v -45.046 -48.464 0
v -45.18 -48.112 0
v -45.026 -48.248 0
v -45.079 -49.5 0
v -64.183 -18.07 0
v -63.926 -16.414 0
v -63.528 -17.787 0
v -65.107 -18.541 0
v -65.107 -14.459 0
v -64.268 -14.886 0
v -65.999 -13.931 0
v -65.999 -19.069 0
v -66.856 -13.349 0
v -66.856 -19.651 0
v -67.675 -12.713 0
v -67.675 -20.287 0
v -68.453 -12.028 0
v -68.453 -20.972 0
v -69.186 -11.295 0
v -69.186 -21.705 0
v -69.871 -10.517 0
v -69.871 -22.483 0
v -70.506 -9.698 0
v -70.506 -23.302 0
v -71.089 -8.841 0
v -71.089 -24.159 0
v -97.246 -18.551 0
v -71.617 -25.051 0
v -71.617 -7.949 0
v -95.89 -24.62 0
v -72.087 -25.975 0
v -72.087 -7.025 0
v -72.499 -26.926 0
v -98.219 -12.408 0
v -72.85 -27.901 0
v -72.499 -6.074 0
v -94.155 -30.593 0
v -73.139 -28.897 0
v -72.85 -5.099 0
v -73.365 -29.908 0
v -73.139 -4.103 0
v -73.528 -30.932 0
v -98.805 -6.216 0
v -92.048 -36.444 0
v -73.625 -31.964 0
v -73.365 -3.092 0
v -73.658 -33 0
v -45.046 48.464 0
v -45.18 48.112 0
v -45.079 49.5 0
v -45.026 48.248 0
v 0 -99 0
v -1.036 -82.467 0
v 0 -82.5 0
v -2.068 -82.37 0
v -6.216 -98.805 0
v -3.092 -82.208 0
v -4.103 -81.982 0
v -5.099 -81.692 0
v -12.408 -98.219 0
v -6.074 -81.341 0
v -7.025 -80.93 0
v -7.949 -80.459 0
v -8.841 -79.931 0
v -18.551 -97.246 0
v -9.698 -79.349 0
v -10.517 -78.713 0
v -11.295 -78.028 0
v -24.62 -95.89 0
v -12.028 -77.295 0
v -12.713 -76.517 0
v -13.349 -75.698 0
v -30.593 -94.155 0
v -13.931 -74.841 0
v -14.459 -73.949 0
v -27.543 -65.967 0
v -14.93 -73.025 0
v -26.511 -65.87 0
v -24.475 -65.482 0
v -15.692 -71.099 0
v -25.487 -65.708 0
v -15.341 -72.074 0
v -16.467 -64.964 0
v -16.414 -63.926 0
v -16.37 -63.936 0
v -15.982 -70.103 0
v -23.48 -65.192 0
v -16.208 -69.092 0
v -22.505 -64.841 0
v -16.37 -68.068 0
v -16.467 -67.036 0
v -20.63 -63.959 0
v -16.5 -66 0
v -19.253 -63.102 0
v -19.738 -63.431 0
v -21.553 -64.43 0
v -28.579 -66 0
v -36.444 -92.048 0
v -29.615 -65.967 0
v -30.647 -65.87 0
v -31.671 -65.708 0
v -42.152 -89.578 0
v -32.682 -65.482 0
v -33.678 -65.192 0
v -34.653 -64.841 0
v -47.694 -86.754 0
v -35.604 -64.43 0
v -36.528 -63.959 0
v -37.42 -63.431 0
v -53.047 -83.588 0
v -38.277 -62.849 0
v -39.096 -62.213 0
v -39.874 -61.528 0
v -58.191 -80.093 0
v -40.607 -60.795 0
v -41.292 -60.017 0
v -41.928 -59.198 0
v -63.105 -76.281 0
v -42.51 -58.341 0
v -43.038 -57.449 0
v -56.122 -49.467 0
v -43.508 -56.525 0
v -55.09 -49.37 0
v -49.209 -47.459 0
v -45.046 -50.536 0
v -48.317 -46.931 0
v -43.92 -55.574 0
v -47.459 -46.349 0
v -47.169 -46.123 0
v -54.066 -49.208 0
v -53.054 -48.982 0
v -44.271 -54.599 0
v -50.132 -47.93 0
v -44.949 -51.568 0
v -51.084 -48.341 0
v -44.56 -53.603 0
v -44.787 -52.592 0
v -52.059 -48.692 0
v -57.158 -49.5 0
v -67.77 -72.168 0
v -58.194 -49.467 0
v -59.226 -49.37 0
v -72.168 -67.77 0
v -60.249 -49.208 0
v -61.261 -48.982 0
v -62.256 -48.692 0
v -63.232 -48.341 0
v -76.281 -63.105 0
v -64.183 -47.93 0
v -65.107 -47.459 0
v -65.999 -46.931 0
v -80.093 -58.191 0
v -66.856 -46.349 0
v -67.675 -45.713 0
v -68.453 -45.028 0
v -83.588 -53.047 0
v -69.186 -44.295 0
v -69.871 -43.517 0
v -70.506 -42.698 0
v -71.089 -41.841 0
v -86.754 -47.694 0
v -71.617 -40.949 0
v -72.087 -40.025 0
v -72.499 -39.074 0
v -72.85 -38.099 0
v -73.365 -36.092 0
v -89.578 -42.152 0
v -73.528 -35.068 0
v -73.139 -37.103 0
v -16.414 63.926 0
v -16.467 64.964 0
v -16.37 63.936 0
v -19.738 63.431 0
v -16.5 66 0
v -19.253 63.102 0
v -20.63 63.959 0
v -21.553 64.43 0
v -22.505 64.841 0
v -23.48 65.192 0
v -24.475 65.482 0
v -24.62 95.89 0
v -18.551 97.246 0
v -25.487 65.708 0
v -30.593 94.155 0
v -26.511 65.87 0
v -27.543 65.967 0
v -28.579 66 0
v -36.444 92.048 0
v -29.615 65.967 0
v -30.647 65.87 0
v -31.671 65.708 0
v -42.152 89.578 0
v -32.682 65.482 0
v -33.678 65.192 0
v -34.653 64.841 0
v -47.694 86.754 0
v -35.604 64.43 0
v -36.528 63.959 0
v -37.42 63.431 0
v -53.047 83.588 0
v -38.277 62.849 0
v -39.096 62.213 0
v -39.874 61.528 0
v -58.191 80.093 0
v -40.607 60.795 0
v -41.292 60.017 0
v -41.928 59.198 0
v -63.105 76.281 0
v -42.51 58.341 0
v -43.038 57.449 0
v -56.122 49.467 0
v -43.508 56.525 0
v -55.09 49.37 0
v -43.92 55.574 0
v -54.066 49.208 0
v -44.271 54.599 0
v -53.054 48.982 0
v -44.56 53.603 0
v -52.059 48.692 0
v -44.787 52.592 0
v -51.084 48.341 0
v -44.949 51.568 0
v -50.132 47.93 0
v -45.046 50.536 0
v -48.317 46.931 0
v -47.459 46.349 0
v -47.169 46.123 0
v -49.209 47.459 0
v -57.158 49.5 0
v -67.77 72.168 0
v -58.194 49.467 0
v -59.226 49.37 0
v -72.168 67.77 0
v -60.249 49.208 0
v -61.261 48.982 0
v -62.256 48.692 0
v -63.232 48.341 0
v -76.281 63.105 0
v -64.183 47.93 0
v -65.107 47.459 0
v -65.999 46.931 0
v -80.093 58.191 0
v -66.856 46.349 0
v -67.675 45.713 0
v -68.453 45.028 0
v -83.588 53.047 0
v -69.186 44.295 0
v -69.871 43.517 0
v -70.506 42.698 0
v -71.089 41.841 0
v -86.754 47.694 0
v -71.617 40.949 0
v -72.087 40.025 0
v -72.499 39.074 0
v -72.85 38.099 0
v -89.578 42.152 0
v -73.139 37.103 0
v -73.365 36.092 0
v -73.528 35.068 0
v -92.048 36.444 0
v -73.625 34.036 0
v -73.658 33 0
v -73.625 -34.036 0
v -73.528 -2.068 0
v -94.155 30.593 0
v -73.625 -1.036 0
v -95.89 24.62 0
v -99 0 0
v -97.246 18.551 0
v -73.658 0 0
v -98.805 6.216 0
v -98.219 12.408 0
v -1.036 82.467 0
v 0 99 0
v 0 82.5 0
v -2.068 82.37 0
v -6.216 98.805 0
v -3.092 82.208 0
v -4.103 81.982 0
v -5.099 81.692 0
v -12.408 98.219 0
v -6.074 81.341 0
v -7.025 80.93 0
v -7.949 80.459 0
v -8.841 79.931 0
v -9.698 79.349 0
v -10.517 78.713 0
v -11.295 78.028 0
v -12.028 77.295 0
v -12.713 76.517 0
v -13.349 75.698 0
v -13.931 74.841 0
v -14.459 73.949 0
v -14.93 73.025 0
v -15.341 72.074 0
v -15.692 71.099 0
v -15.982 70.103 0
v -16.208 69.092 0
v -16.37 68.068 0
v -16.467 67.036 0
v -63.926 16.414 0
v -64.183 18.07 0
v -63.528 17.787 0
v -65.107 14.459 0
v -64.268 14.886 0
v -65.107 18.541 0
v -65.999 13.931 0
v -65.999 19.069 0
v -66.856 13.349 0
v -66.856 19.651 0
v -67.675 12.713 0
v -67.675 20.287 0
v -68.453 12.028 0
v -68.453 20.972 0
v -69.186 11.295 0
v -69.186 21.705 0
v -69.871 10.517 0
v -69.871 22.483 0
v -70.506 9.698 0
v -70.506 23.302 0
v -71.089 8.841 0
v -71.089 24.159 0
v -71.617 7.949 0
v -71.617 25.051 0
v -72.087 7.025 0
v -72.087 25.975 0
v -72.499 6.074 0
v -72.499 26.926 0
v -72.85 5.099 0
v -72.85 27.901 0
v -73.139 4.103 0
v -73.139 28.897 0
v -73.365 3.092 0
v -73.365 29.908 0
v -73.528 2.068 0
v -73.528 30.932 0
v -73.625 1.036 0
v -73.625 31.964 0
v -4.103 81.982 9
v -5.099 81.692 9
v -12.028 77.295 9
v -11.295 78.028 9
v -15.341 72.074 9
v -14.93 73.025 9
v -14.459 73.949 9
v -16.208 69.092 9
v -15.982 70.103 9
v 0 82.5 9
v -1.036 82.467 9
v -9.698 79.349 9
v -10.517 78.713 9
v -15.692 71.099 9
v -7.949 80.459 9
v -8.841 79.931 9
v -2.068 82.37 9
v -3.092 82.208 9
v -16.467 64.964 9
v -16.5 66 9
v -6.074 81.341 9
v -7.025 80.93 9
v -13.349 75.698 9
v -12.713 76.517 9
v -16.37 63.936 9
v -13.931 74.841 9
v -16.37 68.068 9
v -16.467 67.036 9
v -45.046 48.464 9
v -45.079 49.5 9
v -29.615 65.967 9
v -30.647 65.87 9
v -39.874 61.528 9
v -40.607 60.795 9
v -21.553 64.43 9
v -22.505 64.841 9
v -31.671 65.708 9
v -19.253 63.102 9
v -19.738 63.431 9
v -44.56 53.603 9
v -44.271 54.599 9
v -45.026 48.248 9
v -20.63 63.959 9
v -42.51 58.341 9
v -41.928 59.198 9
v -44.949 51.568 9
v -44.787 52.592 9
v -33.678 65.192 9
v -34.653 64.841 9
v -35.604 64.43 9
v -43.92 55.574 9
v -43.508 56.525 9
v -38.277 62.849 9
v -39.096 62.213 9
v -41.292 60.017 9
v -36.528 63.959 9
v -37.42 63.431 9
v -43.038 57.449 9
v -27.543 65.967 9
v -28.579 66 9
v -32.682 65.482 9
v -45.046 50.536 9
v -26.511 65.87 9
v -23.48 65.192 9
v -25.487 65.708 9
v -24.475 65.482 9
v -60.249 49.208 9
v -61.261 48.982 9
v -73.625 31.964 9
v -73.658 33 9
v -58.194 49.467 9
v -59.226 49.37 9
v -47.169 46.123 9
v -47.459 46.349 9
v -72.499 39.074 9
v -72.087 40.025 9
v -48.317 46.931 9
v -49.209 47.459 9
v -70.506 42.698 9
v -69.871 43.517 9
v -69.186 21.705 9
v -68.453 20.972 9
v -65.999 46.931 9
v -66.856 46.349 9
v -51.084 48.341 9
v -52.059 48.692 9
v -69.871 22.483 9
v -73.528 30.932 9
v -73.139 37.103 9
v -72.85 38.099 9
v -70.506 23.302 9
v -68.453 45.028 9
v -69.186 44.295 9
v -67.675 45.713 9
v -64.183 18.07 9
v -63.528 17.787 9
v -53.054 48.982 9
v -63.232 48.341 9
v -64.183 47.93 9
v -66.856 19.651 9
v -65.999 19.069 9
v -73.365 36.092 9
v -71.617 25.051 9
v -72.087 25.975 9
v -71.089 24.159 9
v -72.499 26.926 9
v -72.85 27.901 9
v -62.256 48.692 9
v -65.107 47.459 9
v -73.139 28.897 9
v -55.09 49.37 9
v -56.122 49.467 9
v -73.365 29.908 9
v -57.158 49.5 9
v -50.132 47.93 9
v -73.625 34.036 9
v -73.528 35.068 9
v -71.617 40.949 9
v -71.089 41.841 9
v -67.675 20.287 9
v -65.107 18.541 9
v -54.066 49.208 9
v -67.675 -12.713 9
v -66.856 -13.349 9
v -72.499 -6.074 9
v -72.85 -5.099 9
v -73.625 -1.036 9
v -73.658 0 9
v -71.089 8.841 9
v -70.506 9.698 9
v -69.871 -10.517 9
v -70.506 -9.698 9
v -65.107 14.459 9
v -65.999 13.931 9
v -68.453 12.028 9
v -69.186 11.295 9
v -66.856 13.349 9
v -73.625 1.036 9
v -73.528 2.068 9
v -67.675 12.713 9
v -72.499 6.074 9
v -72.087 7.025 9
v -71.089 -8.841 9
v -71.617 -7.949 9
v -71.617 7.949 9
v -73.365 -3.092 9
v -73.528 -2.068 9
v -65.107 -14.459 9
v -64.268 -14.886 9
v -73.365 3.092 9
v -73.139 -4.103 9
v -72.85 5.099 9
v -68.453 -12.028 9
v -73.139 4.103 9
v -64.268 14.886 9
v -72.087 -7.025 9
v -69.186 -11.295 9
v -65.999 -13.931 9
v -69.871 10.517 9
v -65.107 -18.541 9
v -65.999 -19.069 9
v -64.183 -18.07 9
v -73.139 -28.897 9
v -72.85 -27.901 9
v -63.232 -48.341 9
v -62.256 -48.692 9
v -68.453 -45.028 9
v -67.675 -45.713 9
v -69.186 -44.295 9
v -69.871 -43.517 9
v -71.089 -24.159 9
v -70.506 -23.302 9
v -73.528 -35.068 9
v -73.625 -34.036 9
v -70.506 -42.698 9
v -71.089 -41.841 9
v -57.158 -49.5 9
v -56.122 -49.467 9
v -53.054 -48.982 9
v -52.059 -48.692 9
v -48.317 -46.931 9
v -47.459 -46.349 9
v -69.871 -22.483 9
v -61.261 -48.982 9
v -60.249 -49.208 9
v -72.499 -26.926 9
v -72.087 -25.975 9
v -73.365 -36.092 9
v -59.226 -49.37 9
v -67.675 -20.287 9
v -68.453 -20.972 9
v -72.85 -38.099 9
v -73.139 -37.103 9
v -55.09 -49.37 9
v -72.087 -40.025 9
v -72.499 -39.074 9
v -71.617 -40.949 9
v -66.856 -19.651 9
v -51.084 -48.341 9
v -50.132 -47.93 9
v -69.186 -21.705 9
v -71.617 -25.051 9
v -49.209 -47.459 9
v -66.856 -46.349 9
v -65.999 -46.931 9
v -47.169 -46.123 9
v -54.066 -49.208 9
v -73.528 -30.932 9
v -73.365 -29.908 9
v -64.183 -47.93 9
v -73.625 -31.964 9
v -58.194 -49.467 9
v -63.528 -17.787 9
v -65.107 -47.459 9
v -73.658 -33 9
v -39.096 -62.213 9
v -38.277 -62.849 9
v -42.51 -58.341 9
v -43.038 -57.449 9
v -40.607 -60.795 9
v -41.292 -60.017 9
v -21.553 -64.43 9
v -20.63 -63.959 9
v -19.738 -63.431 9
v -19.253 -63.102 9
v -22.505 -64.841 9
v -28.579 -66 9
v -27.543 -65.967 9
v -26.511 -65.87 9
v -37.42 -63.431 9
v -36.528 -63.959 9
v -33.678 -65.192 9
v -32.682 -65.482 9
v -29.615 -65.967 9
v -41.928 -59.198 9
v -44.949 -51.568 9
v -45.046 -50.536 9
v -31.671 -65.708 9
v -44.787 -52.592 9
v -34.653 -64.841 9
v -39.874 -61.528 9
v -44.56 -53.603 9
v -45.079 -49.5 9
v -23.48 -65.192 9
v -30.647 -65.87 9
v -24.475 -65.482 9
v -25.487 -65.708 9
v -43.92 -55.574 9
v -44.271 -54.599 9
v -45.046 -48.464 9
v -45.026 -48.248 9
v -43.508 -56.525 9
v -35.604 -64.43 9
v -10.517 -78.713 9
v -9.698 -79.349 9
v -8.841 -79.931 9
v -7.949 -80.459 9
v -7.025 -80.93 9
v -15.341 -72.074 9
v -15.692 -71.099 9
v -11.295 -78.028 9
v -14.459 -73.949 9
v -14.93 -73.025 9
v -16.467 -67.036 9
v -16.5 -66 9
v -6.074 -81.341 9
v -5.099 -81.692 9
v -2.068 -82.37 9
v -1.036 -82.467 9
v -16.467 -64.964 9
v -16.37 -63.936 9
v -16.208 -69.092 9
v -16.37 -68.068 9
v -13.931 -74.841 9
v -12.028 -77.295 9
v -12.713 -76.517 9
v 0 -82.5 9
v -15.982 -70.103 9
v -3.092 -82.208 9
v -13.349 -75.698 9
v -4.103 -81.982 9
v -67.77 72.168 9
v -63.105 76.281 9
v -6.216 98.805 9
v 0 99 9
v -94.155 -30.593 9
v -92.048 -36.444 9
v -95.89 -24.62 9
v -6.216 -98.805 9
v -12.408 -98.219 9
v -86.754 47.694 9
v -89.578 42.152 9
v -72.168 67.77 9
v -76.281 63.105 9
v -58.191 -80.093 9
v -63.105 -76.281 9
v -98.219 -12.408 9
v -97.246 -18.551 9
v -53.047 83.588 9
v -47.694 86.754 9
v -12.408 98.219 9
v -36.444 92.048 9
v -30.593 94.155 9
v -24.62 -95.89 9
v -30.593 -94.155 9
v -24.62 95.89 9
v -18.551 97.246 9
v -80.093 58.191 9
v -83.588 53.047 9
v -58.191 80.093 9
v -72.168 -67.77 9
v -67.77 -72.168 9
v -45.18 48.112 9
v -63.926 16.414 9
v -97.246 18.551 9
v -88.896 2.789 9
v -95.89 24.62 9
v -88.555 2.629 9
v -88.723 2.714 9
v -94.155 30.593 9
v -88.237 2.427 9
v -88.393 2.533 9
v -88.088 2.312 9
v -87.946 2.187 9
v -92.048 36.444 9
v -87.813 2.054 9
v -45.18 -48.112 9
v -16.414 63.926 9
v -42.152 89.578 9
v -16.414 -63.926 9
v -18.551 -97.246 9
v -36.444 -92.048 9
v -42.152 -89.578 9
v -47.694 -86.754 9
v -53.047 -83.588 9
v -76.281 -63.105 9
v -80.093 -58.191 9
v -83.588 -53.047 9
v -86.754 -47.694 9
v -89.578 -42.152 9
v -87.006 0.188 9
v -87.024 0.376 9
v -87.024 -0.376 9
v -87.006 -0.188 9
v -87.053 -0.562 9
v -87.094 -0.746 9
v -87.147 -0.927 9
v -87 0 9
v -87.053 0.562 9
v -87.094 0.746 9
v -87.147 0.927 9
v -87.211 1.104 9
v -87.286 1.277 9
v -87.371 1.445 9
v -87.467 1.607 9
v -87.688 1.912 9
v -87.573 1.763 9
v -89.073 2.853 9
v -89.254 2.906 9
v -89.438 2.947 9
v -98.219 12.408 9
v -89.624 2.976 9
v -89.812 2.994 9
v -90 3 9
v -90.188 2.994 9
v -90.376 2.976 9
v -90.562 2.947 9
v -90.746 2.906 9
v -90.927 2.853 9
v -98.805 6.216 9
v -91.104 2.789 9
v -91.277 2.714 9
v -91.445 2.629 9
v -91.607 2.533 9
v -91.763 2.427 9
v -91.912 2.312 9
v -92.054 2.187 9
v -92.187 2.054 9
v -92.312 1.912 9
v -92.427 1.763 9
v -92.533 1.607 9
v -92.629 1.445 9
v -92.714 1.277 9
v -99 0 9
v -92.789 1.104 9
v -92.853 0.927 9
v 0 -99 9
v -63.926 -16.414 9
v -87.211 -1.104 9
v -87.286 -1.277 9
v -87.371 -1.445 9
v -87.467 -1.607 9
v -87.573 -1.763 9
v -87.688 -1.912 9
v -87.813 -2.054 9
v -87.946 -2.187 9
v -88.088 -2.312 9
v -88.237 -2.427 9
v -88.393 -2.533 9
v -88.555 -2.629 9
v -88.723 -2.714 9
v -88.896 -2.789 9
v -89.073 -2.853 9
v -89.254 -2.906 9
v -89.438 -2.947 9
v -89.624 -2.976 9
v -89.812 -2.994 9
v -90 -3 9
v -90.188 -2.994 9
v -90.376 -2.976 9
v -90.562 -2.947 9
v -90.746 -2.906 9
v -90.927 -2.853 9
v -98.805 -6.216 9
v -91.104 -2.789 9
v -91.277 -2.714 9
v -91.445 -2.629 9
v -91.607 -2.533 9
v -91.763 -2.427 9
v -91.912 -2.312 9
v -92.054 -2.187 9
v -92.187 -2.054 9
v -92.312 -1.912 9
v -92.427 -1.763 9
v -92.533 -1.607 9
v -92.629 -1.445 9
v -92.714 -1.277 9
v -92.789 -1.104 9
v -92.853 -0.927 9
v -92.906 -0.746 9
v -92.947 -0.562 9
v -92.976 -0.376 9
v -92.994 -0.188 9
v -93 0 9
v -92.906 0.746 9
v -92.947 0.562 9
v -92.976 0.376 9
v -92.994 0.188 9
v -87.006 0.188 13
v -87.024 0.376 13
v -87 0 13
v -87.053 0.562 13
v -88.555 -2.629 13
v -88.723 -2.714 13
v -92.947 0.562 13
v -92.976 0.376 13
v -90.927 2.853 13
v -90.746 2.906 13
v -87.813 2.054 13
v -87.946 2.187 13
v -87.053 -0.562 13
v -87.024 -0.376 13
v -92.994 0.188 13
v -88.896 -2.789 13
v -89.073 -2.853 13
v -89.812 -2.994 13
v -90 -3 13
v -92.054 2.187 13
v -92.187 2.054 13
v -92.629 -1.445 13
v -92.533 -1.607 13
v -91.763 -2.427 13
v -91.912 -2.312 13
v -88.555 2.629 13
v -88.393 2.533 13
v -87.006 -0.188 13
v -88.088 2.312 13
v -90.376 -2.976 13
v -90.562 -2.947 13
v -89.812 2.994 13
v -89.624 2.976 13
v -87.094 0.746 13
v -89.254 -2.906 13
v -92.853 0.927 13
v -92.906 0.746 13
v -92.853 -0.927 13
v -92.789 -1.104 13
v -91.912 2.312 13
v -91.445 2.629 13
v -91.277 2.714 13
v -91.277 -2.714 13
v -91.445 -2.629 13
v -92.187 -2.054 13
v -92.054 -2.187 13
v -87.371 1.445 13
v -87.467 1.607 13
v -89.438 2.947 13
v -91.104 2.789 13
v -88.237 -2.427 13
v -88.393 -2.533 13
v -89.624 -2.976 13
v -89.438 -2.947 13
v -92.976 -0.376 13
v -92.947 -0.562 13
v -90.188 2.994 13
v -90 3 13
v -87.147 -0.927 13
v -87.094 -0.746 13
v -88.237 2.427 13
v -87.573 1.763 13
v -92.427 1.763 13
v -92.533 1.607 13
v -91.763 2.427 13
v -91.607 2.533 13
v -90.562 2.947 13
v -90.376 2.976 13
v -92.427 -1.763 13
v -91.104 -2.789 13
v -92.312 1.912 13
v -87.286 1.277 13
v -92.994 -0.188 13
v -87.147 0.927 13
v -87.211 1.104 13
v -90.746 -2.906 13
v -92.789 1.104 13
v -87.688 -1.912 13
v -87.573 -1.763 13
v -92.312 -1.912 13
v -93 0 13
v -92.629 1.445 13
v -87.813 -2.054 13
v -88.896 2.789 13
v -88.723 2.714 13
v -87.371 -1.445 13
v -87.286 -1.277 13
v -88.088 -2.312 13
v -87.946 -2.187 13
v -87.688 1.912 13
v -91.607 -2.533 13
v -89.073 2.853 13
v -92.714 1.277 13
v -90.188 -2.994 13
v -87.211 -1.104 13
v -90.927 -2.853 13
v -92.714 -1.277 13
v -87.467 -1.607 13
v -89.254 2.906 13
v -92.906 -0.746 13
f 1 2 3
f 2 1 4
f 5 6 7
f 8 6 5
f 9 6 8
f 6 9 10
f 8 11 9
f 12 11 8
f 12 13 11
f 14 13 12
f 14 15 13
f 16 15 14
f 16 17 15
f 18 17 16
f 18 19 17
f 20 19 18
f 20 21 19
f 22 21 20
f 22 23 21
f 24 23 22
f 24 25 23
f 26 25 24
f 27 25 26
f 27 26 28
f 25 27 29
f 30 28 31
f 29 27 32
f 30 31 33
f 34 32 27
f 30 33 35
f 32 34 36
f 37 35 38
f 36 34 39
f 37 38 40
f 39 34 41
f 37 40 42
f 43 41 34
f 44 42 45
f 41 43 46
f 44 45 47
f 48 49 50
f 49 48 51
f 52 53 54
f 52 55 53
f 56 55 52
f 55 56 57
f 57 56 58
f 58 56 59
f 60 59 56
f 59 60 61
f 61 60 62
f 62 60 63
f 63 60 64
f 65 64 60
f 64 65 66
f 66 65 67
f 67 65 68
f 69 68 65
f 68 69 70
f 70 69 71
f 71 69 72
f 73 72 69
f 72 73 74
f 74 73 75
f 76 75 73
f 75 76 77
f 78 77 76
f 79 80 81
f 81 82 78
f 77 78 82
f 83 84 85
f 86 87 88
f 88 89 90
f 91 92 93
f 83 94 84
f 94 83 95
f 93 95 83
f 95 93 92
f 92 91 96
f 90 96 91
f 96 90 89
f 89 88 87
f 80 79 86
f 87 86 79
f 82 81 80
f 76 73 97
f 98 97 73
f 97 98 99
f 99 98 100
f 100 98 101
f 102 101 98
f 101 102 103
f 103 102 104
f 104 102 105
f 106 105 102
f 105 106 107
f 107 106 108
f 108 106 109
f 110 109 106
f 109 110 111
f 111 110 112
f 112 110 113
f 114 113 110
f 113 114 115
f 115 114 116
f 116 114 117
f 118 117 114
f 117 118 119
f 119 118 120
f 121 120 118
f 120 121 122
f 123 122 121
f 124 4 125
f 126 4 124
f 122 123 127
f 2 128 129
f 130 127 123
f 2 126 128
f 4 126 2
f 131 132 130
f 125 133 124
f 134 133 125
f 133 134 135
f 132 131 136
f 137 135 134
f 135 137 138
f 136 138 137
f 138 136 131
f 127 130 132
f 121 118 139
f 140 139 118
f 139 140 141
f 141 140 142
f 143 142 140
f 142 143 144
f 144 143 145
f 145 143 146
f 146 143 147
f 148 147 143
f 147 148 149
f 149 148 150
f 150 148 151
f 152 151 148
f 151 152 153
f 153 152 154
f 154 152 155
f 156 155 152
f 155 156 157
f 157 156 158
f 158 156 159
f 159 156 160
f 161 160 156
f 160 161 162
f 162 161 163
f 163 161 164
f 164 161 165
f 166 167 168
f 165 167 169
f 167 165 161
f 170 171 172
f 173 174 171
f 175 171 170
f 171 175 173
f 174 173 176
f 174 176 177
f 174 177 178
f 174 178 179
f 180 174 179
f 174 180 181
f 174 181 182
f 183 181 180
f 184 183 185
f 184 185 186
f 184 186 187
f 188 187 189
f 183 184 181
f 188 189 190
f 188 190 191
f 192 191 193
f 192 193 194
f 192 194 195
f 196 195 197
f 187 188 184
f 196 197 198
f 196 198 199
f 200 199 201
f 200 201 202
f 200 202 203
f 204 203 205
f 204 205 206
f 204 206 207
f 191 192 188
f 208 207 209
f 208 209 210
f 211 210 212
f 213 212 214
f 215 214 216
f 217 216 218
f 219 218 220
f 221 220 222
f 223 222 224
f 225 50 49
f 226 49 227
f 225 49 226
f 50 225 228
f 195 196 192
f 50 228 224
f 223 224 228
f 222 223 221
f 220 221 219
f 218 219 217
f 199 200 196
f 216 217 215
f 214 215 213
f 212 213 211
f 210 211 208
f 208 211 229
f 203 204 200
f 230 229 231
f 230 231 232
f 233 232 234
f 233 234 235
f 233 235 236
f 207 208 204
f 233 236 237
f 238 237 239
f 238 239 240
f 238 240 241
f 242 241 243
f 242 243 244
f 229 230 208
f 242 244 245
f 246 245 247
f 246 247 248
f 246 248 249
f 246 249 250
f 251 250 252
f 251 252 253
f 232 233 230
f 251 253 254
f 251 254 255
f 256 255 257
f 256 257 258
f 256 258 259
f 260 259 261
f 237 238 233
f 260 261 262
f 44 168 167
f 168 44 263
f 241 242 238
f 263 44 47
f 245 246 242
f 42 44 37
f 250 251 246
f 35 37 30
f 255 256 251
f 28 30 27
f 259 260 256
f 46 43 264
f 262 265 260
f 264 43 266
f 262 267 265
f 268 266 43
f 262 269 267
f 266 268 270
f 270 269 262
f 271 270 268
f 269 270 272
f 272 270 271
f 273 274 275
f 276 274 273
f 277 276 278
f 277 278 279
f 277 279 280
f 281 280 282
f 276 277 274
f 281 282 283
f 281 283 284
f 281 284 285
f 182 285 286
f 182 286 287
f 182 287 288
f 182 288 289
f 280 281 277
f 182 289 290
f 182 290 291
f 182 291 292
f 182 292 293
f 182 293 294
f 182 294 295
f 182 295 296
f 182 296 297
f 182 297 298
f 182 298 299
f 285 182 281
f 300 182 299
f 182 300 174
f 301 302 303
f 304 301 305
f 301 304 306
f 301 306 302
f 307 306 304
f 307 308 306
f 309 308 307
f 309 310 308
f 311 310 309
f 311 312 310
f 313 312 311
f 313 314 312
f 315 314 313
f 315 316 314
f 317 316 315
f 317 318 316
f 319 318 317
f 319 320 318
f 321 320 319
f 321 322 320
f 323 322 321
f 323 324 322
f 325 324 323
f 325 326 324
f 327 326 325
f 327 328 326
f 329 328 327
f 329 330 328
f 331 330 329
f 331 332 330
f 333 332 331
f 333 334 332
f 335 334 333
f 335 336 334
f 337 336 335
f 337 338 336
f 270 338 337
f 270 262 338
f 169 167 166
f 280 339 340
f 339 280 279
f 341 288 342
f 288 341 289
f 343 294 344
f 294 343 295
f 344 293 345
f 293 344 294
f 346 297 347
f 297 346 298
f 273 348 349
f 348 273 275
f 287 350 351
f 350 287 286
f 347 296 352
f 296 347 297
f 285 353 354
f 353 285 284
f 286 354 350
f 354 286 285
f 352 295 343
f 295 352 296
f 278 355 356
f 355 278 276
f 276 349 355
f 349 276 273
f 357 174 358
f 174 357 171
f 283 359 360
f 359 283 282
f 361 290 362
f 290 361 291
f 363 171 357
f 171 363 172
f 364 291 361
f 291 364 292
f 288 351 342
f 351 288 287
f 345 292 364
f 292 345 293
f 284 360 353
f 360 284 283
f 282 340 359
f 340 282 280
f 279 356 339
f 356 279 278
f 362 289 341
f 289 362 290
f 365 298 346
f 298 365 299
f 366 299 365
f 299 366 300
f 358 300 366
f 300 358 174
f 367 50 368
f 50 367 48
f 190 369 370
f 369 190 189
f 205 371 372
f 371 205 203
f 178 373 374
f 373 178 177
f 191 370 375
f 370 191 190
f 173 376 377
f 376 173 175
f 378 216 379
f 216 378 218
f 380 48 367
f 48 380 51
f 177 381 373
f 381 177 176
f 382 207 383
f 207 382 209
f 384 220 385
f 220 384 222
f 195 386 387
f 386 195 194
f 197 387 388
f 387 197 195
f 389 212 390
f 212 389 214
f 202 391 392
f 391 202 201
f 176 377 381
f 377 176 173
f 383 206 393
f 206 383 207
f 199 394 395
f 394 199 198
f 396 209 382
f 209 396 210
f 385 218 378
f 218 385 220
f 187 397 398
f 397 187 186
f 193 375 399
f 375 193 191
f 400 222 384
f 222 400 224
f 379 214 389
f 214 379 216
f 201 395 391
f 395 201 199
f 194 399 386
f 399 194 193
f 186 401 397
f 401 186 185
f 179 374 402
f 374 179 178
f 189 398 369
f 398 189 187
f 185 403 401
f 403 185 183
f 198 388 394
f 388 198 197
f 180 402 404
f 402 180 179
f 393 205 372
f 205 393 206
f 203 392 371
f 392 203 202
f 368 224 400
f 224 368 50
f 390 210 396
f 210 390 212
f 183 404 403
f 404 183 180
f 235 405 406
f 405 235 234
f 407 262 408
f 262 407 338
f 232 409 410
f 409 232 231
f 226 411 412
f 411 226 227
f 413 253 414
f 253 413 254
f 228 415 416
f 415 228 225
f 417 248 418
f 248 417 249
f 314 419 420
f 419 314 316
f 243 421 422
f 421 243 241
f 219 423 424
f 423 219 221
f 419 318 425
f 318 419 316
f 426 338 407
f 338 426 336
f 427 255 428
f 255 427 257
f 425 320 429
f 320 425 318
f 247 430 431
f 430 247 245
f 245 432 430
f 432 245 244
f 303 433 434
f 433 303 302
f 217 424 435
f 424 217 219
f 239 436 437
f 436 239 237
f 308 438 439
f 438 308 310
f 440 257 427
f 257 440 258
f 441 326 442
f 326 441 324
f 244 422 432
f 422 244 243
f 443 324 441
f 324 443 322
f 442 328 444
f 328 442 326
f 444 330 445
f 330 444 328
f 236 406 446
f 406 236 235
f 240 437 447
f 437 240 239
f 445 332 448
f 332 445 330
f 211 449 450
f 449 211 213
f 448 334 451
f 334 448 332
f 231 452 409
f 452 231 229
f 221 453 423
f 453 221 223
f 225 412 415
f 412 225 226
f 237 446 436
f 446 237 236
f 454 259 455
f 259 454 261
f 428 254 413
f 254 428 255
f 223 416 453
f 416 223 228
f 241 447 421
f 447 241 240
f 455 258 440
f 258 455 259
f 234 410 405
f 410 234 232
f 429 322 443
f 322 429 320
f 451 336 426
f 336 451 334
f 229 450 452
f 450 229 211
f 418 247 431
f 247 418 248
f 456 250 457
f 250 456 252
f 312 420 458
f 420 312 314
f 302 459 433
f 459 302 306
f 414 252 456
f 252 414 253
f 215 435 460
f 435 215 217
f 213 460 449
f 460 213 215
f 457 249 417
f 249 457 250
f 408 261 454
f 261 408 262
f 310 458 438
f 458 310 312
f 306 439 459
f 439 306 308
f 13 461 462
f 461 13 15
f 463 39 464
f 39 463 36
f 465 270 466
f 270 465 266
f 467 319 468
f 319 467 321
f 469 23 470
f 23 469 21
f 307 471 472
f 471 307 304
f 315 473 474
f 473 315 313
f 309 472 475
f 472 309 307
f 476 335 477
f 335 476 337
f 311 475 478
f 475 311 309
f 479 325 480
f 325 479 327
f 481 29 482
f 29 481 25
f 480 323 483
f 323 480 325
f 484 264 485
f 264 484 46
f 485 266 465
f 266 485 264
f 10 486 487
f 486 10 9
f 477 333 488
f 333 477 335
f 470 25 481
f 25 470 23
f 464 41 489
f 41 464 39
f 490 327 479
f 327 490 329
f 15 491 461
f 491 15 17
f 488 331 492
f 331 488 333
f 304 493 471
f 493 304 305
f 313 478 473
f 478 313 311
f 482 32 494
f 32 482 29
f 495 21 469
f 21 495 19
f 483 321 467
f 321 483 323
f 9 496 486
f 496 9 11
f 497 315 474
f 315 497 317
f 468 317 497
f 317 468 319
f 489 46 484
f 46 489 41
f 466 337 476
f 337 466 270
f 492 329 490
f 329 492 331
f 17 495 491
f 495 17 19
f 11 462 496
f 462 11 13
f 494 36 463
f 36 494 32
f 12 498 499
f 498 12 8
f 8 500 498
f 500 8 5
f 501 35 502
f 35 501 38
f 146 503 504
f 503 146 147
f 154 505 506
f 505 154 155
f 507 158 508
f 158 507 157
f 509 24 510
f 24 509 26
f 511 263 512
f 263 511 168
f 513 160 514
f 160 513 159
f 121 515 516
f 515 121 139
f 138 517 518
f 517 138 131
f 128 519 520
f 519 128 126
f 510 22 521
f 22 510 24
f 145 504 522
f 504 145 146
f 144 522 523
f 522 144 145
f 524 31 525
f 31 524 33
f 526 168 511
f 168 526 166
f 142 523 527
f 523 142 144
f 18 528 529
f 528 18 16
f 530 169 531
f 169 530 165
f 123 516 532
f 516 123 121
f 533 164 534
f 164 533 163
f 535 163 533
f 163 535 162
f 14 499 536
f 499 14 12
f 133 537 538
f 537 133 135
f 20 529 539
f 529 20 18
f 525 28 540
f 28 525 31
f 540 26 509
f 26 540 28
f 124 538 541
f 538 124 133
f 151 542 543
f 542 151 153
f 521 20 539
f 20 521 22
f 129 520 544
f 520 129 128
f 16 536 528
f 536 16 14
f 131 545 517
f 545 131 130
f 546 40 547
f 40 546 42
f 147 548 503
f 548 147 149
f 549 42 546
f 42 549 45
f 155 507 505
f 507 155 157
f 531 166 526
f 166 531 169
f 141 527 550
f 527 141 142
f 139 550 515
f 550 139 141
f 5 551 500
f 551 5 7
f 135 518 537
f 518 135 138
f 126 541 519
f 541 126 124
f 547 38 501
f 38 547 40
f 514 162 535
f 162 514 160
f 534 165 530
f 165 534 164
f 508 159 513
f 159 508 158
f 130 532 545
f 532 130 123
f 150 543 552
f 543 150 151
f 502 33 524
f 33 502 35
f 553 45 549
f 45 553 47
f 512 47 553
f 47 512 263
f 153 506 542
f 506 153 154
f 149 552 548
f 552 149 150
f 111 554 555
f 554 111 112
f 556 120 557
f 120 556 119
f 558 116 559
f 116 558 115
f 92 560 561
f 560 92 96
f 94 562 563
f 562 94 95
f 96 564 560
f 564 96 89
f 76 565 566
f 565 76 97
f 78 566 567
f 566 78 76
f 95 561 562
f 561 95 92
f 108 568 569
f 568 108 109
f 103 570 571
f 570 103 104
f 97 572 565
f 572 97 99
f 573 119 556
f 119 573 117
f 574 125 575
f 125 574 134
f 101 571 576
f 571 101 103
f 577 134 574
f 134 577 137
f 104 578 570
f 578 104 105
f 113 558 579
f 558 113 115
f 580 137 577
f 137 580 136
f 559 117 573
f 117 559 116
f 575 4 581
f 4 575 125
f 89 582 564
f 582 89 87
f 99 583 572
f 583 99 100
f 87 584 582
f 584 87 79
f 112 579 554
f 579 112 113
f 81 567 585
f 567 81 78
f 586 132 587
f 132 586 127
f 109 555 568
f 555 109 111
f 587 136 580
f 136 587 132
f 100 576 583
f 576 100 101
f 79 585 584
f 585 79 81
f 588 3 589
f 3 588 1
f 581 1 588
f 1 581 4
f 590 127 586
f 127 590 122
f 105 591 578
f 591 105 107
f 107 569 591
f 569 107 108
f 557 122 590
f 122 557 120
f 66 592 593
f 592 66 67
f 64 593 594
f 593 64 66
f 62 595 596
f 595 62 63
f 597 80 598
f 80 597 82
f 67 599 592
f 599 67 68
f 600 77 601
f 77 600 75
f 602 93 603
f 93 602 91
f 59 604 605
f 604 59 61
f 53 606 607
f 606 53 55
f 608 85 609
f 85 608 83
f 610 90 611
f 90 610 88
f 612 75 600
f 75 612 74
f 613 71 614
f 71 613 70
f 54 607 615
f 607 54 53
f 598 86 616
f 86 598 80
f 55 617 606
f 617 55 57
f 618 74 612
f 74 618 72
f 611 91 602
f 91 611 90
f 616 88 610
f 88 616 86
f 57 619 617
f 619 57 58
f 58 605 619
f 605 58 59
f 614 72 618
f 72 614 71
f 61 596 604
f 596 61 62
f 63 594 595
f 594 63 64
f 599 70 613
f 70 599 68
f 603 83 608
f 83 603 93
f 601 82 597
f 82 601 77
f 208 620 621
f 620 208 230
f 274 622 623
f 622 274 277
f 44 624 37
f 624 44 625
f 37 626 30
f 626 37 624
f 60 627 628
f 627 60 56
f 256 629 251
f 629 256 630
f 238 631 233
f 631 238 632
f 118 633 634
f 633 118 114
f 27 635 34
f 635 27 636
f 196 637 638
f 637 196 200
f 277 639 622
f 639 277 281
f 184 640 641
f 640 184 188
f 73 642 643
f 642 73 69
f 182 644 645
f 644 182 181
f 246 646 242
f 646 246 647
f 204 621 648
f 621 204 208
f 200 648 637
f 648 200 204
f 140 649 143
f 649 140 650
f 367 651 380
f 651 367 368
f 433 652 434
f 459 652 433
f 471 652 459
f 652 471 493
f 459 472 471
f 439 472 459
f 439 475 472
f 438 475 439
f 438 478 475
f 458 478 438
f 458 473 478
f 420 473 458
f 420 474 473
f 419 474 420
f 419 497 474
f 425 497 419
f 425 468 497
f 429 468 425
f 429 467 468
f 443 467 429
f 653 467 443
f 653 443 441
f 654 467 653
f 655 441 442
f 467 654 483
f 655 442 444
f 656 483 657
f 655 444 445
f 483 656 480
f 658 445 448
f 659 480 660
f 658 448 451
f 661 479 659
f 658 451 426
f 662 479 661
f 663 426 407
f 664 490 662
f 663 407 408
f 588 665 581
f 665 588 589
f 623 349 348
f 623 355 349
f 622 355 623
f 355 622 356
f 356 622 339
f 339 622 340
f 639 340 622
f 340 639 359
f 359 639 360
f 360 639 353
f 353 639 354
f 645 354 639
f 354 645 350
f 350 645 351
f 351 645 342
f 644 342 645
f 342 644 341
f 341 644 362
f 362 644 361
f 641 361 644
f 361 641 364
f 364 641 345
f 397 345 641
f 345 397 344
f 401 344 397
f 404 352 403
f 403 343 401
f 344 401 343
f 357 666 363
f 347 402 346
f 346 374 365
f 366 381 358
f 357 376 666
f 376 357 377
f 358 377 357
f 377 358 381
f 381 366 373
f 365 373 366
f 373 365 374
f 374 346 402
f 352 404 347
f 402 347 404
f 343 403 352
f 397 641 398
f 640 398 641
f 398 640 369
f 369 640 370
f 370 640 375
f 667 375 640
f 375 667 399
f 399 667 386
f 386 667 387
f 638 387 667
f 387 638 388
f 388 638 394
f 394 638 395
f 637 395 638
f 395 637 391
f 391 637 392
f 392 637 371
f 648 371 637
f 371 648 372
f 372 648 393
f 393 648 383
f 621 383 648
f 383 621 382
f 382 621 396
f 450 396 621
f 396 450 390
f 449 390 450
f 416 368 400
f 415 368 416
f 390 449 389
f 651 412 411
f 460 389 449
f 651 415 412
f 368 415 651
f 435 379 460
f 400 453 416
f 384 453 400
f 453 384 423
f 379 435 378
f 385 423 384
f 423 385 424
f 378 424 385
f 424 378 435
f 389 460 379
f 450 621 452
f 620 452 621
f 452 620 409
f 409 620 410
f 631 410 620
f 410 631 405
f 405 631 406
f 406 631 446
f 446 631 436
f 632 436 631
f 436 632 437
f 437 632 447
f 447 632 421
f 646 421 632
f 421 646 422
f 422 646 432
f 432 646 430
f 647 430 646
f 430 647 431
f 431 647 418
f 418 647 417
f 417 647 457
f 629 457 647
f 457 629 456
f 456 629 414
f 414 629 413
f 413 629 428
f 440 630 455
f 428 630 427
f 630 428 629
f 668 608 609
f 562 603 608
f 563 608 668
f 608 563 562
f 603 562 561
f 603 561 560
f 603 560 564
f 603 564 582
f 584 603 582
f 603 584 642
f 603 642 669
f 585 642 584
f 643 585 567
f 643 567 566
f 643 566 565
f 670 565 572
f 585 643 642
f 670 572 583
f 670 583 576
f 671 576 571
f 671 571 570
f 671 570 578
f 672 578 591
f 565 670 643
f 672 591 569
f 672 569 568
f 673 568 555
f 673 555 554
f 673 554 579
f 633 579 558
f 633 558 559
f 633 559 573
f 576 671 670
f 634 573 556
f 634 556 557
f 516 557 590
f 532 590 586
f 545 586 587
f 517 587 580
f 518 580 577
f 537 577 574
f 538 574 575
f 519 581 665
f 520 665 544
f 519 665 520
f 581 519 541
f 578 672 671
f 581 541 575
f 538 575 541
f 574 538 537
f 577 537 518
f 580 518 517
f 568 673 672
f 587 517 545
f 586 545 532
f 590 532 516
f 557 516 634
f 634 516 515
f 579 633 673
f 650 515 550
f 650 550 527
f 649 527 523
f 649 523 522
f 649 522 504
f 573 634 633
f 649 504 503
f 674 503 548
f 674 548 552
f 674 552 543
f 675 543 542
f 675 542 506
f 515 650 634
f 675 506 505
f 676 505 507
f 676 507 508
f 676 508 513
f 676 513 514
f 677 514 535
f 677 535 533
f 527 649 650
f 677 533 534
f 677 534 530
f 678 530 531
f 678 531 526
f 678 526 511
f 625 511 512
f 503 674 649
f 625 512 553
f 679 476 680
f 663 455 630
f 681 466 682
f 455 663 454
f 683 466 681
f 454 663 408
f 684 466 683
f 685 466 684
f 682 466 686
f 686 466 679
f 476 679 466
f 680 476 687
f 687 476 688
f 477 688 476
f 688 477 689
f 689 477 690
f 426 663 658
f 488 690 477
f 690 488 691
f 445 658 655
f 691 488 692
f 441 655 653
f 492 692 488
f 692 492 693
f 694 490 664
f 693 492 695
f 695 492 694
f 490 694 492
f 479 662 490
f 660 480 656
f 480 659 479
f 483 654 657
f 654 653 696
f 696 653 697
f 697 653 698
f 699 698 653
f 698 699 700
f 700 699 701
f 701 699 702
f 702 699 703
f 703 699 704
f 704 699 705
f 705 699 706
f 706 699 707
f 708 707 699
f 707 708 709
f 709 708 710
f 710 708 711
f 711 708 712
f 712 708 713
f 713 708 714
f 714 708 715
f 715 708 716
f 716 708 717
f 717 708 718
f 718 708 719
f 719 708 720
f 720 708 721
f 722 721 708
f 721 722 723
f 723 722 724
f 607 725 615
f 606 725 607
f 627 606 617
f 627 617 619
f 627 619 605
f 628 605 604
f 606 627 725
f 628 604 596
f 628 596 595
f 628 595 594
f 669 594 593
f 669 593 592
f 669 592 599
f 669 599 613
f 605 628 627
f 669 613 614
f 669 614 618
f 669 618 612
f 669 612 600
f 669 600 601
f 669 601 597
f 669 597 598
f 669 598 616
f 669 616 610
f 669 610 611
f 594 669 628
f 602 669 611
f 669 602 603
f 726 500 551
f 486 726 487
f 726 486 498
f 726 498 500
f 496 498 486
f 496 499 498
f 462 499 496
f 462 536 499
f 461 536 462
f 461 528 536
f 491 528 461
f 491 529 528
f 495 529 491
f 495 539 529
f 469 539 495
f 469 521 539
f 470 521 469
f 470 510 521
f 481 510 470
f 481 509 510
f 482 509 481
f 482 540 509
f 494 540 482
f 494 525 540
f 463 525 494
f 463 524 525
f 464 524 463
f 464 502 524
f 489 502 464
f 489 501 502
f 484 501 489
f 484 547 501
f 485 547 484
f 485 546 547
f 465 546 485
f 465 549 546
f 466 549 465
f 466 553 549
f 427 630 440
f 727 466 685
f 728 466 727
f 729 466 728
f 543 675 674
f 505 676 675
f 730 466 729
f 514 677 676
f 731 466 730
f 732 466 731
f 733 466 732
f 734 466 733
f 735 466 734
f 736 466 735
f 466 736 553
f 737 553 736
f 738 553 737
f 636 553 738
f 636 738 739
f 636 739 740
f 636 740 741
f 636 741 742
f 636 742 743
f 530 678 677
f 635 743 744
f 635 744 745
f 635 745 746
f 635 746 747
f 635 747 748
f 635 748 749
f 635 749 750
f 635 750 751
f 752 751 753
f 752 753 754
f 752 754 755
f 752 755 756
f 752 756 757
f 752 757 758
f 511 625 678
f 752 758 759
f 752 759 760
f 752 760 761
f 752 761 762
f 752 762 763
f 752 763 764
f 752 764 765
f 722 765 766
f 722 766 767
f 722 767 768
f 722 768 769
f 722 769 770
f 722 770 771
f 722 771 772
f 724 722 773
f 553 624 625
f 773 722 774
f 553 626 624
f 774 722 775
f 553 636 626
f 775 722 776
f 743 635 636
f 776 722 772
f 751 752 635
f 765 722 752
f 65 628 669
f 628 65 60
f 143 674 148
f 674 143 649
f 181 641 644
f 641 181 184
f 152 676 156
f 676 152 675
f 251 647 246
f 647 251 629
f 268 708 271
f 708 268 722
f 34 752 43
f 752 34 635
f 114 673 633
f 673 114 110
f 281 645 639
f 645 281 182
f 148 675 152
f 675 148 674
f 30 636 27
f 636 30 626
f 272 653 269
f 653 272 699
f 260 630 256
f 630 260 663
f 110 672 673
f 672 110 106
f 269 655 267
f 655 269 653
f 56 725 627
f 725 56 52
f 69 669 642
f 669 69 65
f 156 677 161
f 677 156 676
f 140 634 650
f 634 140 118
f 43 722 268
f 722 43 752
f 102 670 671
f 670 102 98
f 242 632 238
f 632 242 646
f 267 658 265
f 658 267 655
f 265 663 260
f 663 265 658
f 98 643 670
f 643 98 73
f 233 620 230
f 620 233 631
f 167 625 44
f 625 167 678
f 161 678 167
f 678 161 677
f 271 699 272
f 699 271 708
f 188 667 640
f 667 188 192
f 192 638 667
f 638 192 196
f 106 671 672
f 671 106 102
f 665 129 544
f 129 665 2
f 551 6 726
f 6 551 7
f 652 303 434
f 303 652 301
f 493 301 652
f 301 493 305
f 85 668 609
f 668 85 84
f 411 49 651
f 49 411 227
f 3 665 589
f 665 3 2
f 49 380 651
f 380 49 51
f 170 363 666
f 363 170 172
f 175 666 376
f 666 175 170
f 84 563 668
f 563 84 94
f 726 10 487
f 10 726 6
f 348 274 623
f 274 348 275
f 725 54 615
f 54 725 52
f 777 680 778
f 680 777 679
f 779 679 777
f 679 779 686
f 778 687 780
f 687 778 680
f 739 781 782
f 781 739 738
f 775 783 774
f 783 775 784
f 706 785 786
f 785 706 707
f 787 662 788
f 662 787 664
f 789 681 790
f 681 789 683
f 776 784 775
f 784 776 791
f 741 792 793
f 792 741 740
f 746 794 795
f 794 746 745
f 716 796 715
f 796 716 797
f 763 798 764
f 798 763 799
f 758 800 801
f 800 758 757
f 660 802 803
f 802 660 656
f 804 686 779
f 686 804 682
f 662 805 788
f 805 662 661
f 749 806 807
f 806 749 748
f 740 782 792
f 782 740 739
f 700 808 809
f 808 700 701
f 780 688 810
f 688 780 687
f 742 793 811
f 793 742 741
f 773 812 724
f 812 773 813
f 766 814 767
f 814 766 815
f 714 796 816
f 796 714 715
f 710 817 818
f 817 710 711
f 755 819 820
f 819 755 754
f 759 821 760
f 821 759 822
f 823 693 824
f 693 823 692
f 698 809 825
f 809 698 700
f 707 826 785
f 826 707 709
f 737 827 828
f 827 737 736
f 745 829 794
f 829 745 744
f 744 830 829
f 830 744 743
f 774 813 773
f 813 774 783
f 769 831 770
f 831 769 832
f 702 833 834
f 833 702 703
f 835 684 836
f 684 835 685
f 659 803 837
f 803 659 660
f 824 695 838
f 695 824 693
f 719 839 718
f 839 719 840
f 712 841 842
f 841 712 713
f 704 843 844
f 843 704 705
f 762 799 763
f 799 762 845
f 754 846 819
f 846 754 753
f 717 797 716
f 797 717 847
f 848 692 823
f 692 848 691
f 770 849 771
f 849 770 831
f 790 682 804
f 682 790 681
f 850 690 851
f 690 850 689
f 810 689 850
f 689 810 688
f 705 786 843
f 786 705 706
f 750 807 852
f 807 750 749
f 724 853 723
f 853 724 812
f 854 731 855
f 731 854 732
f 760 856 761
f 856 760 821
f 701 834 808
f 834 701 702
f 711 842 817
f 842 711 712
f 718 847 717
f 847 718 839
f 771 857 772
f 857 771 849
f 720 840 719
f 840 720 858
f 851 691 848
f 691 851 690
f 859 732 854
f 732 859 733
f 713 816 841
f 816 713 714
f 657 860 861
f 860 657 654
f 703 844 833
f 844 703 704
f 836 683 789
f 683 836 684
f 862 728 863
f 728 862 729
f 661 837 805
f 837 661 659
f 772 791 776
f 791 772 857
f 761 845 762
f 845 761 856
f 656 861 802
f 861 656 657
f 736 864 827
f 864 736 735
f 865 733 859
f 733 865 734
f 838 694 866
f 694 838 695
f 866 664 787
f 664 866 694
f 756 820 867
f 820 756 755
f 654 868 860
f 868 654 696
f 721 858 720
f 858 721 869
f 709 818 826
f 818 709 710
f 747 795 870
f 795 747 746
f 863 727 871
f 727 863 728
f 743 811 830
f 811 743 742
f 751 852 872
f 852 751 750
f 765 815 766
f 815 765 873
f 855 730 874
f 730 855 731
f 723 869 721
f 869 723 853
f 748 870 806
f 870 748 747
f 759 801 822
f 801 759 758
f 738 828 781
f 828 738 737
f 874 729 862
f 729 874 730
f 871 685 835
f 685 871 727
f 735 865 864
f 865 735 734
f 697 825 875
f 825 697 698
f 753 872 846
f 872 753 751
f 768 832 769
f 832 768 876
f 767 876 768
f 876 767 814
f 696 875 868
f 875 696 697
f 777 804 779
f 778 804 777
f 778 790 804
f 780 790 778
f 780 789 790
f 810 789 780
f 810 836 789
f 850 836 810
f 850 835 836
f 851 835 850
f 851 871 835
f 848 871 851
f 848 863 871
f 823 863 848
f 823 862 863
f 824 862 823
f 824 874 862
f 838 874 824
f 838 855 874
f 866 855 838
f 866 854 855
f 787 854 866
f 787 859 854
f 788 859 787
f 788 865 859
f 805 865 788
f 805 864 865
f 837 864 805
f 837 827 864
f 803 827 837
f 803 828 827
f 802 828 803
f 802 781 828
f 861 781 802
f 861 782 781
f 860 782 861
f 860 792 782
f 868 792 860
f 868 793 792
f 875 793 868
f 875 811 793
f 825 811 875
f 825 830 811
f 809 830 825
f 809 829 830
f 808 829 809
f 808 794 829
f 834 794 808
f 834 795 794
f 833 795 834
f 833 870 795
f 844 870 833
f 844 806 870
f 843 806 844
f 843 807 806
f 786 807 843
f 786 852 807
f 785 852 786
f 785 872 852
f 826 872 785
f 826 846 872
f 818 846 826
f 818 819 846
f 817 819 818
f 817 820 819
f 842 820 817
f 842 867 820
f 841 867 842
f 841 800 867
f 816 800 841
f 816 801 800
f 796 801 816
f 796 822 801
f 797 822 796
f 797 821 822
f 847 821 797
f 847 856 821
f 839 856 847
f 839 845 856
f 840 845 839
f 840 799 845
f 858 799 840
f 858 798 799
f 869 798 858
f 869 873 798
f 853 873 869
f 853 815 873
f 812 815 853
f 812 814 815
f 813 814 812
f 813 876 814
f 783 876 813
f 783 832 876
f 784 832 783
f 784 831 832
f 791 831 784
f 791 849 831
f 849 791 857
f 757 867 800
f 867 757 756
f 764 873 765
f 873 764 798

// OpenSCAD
$fn=100;
difference()
{
    // Major portion of the solid
    cylinder(r=16.5*6,h=9);

    r=16.5;
    h=10;
    for (a = [0:6])
    {
        ang=a*60;
        l=3.4641*r;
        // Pcoords: (2*sart(3)*r, 30)
        translate([l*cos(ang),l*sin(ang),0]) cylinder(r=r, h=h);
        nang=ang+30;
        nl=4*r;
        // Pcoords: (4*r, 60)
        translate([nl*cos(nang),nl*sin(nang),0]) cylinder(r=r, h=h);
    }
    // Get rid of all the insides
    cylinder(r=4*16.5,h=10);
    translate([0,-200,0]) cube([200,400,20]);
}
translate([-90,0,8]) cylinder(r=3,h=5);
